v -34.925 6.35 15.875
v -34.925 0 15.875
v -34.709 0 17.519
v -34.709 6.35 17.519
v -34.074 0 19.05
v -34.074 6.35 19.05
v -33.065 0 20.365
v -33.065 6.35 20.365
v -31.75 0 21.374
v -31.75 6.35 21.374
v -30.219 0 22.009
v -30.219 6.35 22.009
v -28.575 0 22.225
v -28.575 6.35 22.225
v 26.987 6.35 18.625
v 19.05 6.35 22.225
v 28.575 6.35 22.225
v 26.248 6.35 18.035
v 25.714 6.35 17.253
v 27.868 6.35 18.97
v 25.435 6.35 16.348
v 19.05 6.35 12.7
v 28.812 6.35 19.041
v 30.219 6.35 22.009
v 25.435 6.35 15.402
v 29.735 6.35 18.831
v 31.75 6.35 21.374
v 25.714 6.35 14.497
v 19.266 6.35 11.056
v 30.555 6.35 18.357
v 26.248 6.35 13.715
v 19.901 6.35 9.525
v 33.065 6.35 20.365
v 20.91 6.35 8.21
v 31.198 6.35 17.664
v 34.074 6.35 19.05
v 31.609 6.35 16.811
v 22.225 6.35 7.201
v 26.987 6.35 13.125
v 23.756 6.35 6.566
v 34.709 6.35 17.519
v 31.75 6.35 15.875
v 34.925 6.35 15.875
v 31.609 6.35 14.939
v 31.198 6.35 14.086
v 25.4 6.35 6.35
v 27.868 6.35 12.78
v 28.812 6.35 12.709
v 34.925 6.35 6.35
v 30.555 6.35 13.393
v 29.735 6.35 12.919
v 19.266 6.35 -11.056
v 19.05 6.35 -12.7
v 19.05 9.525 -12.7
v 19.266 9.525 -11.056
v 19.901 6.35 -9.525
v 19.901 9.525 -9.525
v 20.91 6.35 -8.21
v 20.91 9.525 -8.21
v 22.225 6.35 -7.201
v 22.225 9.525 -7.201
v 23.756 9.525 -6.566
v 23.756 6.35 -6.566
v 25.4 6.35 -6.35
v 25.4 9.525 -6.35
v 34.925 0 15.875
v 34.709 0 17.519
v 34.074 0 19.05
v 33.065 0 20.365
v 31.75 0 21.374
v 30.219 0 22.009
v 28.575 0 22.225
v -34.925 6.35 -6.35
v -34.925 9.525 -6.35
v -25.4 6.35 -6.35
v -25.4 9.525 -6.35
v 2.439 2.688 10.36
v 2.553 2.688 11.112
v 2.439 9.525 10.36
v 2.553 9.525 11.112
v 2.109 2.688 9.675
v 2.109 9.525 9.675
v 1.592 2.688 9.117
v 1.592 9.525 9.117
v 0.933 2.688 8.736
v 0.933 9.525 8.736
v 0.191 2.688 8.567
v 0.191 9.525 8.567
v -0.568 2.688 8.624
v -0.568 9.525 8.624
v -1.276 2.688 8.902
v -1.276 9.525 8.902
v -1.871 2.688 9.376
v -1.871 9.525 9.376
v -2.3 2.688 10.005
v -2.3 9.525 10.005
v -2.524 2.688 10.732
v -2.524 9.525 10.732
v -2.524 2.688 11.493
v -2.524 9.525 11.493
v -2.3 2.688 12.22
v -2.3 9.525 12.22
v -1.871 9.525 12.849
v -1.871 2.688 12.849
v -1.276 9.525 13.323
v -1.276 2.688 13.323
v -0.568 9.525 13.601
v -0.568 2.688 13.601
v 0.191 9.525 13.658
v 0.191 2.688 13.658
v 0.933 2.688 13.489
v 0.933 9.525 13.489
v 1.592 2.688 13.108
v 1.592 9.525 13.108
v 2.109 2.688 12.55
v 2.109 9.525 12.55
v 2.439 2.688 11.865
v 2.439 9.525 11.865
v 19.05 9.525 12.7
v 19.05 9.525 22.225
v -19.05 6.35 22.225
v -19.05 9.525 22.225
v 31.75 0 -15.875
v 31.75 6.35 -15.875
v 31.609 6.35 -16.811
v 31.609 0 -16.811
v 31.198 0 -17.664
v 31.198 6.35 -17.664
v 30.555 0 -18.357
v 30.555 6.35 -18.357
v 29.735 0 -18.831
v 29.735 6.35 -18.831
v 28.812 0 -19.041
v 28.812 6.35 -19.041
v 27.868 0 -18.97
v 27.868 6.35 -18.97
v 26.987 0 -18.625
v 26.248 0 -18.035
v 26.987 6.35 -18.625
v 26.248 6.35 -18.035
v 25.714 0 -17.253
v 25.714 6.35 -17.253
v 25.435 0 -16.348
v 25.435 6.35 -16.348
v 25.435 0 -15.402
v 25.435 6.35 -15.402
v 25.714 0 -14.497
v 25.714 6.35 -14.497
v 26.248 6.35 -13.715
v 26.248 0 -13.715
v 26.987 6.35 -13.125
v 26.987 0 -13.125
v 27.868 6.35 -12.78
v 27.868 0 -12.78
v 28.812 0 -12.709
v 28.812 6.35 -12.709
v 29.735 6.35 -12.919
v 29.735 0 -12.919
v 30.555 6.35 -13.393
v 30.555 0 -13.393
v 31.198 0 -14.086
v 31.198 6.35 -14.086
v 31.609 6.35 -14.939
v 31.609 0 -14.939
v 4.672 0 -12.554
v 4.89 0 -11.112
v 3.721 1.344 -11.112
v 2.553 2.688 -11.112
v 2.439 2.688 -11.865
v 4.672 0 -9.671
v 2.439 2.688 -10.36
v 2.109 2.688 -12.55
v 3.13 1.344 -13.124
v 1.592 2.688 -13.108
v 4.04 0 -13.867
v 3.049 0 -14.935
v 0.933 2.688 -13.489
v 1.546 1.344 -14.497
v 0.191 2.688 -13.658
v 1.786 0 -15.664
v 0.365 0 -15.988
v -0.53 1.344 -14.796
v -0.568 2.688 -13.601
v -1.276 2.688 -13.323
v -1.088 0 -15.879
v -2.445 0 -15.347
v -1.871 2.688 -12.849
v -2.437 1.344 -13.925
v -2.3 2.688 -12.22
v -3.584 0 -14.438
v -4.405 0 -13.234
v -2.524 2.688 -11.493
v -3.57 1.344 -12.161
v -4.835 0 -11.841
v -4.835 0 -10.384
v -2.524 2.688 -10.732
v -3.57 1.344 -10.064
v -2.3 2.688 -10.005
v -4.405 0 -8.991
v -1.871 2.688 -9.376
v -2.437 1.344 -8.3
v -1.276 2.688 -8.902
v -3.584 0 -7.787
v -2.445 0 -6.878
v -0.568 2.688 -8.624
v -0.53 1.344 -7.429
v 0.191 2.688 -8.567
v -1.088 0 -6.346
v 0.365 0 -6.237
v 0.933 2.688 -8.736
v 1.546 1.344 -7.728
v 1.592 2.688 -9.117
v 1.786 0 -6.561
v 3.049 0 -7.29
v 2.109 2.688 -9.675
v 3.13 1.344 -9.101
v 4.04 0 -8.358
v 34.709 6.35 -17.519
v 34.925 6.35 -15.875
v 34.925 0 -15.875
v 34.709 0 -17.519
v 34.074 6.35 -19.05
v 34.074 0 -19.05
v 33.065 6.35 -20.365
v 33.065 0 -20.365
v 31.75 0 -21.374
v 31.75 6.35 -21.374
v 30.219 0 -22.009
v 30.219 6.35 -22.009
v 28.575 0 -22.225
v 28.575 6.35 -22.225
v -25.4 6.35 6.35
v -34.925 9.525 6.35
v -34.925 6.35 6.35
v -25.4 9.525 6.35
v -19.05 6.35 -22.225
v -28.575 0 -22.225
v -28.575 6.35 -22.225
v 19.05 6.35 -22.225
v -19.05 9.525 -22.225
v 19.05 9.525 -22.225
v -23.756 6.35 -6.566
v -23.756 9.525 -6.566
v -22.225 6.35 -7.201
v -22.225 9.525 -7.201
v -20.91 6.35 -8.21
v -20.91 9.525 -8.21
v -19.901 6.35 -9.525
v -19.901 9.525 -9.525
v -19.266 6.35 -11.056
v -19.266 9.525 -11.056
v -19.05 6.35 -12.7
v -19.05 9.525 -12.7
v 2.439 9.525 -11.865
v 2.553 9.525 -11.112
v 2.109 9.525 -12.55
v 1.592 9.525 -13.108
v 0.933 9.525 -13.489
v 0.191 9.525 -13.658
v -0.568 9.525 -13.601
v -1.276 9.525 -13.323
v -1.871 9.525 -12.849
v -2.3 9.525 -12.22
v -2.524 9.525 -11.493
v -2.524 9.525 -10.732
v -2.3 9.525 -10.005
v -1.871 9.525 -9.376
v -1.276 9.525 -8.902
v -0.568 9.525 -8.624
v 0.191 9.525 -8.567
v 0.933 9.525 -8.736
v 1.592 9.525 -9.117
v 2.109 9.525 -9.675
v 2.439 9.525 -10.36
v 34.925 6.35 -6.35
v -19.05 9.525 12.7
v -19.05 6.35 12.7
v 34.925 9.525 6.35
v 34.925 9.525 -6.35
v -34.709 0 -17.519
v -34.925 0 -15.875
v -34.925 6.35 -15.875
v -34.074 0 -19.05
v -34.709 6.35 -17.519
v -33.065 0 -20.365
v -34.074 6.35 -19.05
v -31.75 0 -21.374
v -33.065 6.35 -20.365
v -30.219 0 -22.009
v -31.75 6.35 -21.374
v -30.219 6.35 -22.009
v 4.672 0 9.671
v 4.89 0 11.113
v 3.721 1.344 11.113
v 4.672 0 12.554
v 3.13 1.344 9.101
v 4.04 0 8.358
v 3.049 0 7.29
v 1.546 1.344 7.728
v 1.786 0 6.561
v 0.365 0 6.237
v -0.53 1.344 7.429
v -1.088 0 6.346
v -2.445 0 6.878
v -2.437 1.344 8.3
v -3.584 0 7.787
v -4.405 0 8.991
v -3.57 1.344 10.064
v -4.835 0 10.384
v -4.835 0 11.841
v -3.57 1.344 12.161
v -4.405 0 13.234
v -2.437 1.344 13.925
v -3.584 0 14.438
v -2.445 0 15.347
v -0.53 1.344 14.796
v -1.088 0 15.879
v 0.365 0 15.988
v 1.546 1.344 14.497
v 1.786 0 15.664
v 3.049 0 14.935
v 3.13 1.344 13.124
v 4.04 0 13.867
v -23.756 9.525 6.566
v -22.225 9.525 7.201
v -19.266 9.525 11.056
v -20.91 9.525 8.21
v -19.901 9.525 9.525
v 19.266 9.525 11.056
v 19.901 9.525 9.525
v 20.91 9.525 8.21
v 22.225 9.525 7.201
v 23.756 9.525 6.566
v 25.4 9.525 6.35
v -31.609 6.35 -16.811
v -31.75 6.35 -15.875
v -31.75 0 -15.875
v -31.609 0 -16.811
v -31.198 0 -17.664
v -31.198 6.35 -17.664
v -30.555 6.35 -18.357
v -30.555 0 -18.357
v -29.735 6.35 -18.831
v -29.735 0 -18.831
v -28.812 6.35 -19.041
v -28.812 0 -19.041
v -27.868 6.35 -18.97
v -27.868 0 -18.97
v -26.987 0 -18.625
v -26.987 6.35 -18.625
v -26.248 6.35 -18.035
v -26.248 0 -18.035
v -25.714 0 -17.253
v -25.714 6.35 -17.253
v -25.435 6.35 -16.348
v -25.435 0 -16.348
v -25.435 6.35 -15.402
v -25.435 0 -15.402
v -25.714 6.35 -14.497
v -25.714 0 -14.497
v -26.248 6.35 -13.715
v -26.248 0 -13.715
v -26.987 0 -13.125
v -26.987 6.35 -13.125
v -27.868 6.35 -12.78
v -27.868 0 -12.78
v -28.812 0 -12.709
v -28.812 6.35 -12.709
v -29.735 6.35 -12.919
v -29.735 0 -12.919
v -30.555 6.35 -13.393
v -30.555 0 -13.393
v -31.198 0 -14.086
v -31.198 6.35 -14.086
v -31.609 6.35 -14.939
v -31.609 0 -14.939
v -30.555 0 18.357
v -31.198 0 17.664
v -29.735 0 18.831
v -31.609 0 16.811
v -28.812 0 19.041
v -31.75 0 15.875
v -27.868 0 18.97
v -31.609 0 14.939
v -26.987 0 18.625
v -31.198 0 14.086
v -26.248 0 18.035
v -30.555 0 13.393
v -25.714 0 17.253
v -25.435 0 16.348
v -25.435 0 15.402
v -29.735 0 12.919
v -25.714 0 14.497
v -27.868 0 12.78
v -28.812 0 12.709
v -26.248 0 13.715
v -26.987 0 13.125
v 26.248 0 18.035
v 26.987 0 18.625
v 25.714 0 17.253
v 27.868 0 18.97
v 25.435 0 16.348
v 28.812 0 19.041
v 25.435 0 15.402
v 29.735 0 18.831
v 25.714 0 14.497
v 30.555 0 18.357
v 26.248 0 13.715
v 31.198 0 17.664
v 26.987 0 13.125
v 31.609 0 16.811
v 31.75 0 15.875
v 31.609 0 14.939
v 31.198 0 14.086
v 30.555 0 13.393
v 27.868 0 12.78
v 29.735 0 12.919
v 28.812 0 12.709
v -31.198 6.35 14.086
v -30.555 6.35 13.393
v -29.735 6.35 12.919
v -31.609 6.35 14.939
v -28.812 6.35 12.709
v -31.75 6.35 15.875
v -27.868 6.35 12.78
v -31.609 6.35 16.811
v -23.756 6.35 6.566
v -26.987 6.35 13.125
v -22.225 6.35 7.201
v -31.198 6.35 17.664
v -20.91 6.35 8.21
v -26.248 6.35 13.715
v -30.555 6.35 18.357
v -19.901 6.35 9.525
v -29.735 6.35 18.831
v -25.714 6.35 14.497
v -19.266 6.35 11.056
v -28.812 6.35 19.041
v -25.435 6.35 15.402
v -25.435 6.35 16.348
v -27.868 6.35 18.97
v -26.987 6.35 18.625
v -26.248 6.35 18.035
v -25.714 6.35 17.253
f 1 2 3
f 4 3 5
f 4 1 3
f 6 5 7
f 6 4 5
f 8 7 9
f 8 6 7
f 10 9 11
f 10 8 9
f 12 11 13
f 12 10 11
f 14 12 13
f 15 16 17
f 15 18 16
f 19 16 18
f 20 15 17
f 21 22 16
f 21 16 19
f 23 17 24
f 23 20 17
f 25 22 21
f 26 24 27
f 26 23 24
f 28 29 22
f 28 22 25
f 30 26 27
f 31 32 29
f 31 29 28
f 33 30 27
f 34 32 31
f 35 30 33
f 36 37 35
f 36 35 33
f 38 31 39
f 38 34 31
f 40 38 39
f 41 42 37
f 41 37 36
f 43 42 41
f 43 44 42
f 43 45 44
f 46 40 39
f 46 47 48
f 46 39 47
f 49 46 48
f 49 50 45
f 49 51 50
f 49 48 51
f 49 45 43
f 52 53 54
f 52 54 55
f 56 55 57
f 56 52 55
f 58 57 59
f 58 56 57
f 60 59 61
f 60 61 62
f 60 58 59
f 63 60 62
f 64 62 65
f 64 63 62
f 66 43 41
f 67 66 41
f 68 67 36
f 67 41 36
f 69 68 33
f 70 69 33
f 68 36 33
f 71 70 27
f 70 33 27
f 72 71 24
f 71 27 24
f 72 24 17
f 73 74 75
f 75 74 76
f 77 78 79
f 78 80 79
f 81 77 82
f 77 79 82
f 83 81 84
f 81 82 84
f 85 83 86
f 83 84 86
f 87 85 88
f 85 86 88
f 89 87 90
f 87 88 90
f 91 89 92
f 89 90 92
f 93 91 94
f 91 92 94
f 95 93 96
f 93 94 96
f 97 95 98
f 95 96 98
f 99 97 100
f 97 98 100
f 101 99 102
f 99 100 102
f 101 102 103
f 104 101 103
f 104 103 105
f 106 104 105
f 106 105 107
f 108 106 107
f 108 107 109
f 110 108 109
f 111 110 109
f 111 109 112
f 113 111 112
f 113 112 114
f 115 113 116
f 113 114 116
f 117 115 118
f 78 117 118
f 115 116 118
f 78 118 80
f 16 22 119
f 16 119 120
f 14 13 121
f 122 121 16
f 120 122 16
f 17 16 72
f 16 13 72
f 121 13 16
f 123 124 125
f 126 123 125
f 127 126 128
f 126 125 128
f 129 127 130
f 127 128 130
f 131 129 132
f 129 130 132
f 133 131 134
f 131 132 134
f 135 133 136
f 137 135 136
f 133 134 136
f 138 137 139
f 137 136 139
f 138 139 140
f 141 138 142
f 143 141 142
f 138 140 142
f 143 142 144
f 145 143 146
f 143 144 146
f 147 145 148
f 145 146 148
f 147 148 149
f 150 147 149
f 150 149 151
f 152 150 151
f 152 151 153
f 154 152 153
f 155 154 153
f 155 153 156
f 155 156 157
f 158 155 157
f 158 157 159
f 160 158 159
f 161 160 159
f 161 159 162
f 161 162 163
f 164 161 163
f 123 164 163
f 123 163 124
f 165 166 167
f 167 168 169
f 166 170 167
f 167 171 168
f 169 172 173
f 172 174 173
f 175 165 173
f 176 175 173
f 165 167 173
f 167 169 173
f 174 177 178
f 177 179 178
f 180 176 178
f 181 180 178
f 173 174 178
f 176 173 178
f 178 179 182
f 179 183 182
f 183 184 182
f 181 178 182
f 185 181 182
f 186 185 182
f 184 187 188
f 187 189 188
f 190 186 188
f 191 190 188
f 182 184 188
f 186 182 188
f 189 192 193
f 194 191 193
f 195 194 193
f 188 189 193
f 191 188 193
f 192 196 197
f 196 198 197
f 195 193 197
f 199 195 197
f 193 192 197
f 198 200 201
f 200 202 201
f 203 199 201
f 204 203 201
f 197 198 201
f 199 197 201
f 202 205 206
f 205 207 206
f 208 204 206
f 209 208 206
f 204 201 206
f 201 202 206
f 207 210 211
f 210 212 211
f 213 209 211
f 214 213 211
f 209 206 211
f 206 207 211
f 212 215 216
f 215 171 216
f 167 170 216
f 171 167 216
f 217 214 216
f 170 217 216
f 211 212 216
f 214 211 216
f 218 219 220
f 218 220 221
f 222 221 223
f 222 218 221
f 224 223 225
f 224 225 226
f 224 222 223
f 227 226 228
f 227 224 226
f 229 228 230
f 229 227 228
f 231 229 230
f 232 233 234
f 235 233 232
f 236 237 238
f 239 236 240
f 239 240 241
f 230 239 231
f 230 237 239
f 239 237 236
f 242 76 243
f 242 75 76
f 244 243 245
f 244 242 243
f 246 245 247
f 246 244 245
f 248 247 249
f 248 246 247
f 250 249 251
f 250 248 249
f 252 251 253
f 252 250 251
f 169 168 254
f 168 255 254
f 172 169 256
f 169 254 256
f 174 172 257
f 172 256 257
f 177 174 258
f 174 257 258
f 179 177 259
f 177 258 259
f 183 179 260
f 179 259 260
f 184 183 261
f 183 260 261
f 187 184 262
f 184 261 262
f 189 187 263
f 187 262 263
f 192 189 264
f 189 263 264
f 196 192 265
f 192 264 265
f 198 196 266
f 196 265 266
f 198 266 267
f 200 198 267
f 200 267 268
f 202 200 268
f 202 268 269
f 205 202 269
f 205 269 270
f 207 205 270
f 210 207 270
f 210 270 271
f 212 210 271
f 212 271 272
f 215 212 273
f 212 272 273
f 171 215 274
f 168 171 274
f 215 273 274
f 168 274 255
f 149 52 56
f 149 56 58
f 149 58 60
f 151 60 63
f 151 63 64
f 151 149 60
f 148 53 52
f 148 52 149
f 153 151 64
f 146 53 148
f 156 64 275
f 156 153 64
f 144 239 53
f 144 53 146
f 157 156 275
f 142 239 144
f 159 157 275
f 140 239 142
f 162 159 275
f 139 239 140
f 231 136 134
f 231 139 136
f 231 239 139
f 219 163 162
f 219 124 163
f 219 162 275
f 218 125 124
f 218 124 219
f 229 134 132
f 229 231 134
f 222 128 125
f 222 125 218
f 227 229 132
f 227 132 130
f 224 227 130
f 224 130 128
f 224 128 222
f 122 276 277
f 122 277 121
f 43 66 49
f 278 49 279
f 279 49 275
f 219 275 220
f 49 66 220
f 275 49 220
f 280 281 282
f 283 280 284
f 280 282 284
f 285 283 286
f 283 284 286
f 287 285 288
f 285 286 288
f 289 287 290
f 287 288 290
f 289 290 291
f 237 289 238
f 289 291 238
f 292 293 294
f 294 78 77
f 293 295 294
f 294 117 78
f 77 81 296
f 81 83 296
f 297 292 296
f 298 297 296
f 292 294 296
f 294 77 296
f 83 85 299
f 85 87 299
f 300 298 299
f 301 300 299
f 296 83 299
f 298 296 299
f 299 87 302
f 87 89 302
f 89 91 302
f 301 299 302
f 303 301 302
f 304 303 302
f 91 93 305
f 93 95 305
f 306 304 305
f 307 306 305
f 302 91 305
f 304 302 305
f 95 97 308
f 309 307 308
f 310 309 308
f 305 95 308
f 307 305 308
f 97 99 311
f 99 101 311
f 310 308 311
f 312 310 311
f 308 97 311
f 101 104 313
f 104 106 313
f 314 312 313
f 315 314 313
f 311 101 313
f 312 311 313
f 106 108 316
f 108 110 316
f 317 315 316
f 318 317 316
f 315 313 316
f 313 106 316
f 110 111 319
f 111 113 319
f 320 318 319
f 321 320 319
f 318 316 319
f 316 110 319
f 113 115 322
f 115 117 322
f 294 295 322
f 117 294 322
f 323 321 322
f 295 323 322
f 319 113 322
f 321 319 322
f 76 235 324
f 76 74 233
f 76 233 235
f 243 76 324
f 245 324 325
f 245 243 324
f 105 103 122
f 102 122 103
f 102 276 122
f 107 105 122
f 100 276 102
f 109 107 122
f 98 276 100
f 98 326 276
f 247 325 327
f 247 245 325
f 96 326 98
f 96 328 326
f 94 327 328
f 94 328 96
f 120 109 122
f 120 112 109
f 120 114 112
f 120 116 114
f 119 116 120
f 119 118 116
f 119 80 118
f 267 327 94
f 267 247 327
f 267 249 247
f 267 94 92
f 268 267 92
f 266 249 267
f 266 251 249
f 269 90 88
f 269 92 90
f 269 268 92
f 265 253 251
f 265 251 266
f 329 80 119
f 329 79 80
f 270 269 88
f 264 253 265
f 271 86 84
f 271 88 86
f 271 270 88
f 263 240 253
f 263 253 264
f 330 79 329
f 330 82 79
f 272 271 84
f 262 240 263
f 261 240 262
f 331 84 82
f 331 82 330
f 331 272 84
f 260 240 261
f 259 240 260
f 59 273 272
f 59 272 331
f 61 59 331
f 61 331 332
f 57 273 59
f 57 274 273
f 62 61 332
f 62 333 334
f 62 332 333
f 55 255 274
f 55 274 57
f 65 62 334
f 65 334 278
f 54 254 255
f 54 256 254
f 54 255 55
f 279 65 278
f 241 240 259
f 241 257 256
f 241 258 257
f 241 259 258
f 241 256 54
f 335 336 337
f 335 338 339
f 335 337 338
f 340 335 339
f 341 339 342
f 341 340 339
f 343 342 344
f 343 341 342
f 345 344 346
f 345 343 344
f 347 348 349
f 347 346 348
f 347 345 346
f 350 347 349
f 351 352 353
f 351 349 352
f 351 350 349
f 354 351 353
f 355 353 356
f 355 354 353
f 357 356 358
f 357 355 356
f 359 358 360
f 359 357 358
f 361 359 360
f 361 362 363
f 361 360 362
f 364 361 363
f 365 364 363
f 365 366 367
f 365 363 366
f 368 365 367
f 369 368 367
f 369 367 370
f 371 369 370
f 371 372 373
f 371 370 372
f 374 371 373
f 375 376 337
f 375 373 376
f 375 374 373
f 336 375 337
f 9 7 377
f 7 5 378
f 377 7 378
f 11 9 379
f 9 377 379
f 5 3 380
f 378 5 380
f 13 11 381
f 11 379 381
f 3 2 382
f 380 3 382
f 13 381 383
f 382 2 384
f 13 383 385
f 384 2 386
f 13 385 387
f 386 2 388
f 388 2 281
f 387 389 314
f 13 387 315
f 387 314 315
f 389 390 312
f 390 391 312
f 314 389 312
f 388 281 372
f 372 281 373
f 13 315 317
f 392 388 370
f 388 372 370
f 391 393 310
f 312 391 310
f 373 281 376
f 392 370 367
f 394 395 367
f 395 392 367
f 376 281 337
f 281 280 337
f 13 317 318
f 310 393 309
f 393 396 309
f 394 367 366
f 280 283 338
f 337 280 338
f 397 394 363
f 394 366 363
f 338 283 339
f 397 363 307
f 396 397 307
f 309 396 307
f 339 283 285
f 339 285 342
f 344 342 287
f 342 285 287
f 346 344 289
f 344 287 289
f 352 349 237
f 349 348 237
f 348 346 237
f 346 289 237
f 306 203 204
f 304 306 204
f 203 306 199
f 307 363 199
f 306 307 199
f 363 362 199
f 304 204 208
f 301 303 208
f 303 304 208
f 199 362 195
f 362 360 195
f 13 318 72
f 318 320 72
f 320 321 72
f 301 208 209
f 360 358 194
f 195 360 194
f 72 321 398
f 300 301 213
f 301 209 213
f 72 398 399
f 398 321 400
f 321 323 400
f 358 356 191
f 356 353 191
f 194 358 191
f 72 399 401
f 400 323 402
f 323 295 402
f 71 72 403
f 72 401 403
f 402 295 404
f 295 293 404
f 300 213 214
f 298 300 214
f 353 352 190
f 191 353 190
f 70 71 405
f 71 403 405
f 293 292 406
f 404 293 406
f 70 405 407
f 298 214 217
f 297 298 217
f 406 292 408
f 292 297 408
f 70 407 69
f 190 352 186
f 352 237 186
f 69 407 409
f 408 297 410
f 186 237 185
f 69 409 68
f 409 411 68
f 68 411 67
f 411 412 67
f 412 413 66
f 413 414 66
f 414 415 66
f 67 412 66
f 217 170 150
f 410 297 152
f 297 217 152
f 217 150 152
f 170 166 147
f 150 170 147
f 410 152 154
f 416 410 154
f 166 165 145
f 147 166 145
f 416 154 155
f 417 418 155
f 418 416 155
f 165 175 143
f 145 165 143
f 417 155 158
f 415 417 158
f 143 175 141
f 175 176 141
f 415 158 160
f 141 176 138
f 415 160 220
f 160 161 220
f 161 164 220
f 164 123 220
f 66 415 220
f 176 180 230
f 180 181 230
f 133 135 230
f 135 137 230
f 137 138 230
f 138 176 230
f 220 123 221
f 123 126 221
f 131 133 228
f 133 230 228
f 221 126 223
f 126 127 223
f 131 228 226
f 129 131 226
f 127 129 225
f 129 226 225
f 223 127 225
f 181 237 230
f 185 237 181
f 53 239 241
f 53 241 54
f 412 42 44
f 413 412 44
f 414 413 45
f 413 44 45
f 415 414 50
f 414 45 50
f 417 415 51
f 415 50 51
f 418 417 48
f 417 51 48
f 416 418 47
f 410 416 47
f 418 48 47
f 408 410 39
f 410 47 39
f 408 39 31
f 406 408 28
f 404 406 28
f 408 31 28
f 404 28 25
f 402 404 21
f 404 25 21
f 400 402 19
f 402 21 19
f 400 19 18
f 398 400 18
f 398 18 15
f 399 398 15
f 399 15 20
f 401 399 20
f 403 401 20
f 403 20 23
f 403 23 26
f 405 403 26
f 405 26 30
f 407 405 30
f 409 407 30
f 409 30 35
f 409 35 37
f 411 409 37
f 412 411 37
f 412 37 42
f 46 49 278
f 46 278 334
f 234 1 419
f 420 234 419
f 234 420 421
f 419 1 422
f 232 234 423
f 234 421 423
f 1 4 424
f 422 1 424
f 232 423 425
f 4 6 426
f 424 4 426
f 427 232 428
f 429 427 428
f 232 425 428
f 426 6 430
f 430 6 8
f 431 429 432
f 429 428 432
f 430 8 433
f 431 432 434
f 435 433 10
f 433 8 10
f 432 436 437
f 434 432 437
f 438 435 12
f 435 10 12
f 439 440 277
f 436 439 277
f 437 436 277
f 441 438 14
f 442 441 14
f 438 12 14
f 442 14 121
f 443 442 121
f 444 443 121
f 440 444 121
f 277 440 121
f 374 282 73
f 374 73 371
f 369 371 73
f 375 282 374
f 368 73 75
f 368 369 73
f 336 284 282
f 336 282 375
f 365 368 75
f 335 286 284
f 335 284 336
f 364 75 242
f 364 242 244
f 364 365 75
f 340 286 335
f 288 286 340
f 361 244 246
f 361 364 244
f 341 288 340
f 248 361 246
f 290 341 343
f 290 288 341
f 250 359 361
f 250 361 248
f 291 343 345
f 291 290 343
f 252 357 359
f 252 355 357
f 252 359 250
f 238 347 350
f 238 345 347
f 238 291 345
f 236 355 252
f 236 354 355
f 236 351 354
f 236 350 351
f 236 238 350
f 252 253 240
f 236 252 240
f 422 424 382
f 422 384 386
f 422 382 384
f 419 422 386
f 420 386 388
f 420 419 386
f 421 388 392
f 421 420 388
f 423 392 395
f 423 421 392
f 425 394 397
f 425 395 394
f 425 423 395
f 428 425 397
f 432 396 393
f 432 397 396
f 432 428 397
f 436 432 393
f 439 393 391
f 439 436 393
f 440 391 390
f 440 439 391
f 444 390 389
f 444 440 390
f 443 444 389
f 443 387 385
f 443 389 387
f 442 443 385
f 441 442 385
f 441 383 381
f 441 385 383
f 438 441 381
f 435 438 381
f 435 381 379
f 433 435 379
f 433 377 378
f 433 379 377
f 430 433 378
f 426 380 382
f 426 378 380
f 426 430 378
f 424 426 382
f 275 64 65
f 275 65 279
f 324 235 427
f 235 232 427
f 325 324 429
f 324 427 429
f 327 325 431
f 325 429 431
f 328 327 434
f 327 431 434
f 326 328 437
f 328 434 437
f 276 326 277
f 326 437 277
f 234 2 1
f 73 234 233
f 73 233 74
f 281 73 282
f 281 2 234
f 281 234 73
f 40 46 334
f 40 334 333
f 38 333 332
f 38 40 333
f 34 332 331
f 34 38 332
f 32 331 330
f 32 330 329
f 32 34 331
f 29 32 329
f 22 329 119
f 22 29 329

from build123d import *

# Parameters (mm, degrees)
SKETCH1_W                                          = 69.85
SKETCH1_H                                          = 44.45
BOSS_EXTRUDE1_DEPTH                                = 9.525
CSK_FOR_10_FLAT_HEAD_MACHINE_SCREW_100_D           = 5.1054
CSK_FOR_10_FLAT_HEAD_MACHINE_SCREW_100_CSINK_D     = 9.779
CSK_FOR_10_FLAT_HEAD_MACHINE_SCREW_100_CSINK_ANGLE = 82
FILLET4_R                                          = 6.35
F_1_4_0_25_DIAMETER_HOLE1_D                        = 6.35
SKETCH10_W                                         = 15.875
SKETCH10_H                                         = 15.875
CUT_EXTRUDE2_DEPTH                                 = 3.175
FILLET5_R                                          = 6.35
FILLET5_OF_MIRROR2_R                               = 6.35
MIRROR3_START                                      = 6.35
MIRROR3_OUTLINE_R                                  = 3.175
MIRROR3_DEPTH                                      = 3.175


# Read off the part's stored shape, not the designer's step: Mirror3
with BuildPart() as part:
    # Sketch1 → Boss-Extrude1 (new body)
    with BuildSketch(Plane(origin=(0, 0, 0), x_dir=(1, 0, 0), z_dir=(0, 1, 0))):
        Rectangle(SKETCH1_W, SKETCH1_H)
    extrude(amount=BOSS_EXTRUDE1_DEPTH)

    # CSK for #10 Flat Head Machine Screw (100)1 (through all)
    with Locations(Plane(origin=(0, 0, 0), x_dir=(-1, 0, 0), z_dir=(0, -1, 0))):
        with Locations((0, 11.1125), (0, -11.1125)):
            CounterSinkHole(CSK_FOR_10_FLAT_HEAD_MACHINE_SCREW_100_D / 2, CSK_FOR_10_FLAT_HEAD_MACHINE_SCREW_100_CSINK_D / 2, counter_sink_angle=CSK_FOR_10_FLAT_HEAD_MACHINE_SCREW_100_CSINK_ANGLE)

    # Fillet4
    fillet4_edges = [part.edges().sort_by_distance(p)[0] for p in [
        (34.925, 4.7625, 22.225),
        (-34.925, 4.7625, 22.225),
        (-34.925, 4.7625, -22.225),
        (34.925, 4.7625, -22.225),
    ]]
    fillet(fillet4_edges, radius=FILLET4_R)

    # 1/4 (0.25) Diameter Hole1 (through all)
    with Locations(Plane(origin=(0, 0, 0), x_dir=(-1, 0, 0), z_dir=(0, -1, 0))):
        with Locations((-28.575, 15.875), (-28.575, -15.875)):
            f_1_4_0_25_diameter_hole1 = Hole(F_1_4_0_25_DIAMETER_HOLE1_D / 2)

    # Mirror1: 1/4 (0.25) Diameter Hole1 across plane
    add(f_1_4_0_25_diameter_hole1.mirror(Plane(origin=(0, 0, 0), x_dir=(0, 0, 1), z_dir=(1, 0, 0))), mode=Mode.SUBTRACT)

    # Sketch10 → Cut-Extrude2 (cut)
    with BuildSketch(Plane(origin=(0, 9.525, 0), x_dir=(1, 0, 0), z_dir=(0, 1, 0))):
        with Locations((-26.9875, 14.2875)):
            Rectangle(SKETCH10_W, SKETCH10_H)
    cut_extrude2 = extrude(amount=-CUT_EXTRUDE2_DEPTH, mode=Mode.SUBTRACT)

    # Fillet5
    fillet5_edges = [part.edges().sort_by_distance(p)[0] for p in [
        (-19.05, 7.9375, -6.35),
    ]]
    fillet(fillet5_edges, radius=FILLET5_R)

    # Mirror2: Cut-Extrude2 across plane
    add(cut_extrude2.mirror(Plane.XY), mode=Mode.SUBTRACT)

    # Fillet5 of Mirror2
    fillet5_of_mirror2_edges = [part.edges().sort_by_distance(p)[0] for p in [
        (-19.05, 7.9375, 6.35),
    ]]
    fillet(fillet5_of_mirror2_edges, radius=FILLET5_OF_MIRROR2_R)

    # Mirror3 outline → Mirror3 (cut)
    # profile 1 of 2: a face of its own
    with BuildSketch(Plane(origin=(0, 0, 0), x_dir=(1, 0, 0), z_dir=(0, 1, 0)).offset(MIRROR3_START)):
        with BuildLine():
            Line((25.4, 6.35), (34.925, 6.35))
            Line((34.925, 6.35), (34.925, 15.875))
            ThreePointArc((34.925, 15.875), (33.065128061, 20.365128061), (28.575, 22.225))
            Line((28.575, 22.225), (19.05, 22.225))
            Line((19.05, 22.225), (19.05, 12.7))
            ThreePointArc((19.05, 12.7), (20.909871939, 8.209871939), (25.4, 6.35))
        make_face()
        with Locations((28.575, 15.875)):
            Circle(MIRROR3_OUTLINE_R, mode=Mode.SUBTRACT)
    # profile 2 of 2: a face of its own
    with BuildSketch(Plane(origin=(0, 0, 0), x_dir=(1, 0, 0), z_dir=(0, 1, 0)).offset(MIRROR3_START)):
        with BuildLine():
            Line((34.925, -15.875), (34.925, -6.35))
            Line((34.925, -6.35), (25.4, -6.35))
            ThreePointArc((25.4, -6.35), (20.909871939, -8.209871939), (19.05, -12.7))
            Line((19.05, -12.7), (19.05, -22.225))
            Line((19.05, -22.225), (28.575, -22.225))
            ThreePointArc((28.575, -22.225), (33.065128061, -20.365128061), (34.925, -15.875))
        make_face()
        with Locations((28.575, -15.875)):
            Circle(MIRROR3_OUTLINE_R, mode=Mode.SUBTRACT)
    extrude(amount=MIRROR3_DEPTH, mode=Mode.SUBTRACT)


solid = part.part
